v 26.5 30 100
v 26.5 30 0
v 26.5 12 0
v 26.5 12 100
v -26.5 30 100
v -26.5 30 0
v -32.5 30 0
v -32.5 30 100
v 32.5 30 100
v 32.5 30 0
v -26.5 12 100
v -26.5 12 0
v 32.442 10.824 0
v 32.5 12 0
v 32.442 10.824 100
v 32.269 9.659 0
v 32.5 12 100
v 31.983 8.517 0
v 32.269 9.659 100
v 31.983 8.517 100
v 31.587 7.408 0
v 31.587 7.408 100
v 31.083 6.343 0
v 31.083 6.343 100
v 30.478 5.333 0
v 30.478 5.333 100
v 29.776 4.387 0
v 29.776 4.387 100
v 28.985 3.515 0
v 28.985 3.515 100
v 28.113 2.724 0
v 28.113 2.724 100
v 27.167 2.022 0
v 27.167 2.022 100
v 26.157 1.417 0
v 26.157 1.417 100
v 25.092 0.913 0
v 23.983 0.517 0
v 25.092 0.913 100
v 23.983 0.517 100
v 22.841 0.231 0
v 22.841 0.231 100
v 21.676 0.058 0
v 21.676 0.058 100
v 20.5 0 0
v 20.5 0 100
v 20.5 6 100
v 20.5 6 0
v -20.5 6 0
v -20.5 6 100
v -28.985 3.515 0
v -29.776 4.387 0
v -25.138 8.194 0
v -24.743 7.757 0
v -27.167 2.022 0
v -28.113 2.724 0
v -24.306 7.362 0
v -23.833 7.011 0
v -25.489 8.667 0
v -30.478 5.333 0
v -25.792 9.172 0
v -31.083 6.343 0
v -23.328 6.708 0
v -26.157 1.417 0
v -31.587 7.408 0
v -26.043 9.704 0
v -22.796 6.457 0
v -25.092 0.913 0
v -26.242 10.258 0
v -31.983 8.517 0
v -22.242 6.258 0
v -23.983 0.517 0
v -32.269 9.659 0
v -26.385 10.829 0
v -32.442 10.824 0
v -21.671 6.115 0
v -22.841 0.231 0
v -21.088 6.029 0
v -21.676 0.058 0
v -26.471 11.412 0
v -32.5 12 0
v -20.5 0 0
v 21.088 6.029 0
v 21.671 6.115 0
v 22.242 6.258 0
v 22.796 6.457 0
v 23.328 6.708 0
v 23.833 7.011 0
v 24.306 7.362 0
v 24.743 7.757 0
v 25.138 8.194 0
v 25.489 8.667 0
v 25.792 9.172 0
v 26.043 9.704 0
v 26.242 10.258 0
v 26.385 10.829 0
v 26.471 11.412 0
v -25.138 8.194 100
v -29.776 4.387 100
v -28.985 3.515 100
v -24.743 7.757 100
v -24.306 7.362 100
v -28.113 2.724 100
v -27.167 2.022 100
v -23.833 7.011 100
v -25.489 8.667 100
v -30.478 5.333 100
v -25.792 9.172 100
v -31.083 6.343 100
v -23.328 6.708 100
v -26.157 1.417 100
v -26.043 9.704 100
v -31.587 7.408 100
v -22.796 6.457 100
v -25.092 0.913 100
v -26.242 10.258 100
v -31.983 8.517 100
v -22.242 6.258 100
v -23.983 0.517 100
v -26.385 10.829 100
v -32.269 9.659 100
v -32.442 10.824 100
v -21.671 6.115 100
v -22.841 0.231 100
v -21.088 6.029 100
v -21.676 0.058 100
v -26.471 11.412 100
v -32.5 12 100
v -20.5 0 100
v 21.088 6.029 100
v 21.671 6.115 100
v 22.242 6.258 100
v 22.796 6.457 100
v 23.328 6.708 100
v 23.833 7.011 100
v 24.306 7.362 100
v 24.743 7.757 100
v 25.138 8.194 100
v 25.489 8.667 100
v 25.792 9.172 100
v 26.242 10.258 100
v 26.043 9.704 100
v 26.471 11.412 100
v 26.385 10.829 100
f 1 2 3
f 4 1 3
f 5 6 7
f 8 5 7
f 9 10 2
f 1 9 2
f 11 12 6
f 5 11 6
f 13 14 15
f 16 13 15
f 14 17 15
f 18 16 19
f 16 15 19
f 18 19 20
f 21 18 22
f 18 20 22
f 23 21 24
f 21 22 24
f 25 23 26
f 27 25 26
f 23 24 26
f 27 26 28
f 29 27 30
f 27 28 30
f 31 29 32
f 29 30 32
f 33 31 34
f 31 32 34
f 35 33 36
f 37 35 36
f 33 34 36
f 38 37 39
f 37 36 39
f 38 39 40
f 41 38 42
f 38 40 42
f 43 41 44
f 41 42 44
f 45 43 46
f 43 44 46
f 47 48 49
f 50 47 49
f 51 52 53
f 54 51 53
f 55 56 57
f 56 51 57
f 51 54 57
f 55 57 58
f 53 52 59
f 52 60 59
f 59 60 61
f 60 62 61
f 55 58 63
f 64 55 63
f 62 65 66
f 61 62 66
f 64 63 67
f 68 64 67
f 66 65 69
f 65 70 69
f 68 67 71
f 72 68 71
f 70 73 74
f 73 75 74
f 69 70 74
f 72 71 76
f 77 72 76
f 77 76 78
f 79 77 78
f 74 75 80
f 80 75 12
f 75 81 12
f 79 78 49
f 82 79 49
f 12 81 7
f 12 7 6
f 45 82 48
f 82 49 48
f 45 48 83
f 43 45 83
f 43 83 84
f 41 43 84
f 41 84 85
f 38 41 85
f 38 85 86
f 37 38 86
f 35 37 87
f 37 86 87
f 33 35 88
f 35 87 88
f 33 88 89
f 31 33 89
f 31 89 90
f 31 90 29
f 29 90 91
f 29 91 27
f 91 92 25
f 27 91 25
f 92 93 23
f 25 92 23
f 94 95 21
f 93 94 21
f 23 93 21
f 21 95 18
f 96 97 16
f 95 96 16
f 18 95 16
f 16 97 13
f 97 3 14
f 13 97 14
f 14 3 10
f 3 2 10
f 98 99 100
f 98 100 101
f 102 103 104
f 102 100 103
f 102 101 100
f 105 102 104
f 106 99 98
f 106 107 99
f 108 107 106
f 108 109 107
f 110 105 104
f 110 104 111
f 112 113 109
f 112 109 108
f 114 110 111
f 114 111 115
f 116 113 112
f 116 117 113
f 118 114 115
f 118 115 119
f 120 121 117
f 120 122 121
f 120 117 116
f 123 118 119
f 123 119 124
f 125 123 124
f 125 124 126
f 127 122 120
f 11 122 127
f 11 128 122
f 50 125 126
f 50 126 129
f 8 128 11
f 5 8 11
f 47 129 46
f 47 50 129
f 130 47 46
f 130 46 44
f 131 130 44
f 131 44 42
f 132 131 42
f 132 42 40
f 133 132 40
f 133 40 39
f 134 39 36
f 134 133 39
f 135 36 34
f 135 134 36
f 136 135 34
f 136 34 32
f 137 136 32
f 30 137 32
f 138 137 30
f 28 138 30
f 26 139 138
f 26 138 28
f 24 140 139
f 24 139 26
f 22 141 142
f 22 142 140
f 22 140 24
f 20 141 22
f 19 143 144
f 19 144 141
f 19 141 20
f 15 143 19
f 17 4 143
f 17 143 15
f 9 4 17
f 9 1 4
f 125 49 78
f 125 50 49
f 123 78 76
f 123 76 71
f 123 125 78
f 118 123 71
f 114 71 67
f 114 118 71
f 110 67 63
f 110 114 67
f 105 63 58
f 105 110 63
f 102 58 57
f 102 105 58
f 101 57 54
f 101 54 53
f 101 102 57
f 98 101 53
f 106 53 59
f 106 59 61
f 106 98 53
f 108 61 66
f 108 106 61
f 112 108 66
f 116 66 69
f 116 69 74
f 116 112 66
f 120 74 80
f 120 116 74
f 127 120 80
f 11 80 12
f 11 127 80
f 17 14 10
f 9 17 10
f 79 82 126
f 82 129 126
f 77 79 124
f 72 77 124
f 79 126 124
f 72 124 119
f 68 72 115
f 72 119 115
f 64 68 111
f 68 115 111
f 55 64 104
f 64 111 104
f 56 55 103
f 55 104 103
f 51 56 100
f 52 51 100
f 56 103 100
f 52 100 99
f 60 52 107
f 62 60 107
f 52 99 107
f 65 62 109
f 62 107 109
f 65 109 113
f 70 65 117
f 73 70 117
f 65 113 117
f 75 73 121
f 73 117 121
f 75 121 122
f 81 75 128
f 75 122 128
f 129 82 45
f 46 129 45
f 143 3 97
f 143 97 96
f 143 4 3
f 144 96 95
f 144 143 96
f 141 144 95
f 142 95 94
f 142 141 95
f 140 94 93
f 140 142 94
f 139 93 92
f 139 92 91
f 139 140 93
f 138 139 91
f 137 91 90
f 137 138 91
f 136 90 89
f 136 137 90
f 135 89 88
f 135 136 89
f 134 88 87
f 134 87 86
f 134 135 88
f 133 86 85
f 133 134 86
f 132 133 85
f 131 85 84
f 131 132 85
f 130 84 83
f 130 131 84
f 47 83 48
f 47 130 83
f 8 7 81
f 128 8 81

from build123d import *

# Parameters (mm, degrees)
F1_DEPTH = 100
F2_R     = 6
F3_R     = 12


with BuildPart() as f1:
    # F0 (on Top) → F1 (new body)
    with BuildSketch(Plane.XY):
        Polygon((0, 6), (0, 0), (32.5, 0), (32.5, 30), (26.5, 30), (26.5, 6), align=None)
        Polygon((-32.5, 0), (0, 0), (0, 6), (-26.5, 6), (-26.5, 30), (-32.5, 30), align=None)
    extrude(amount=F1_DEPTH)

    # F2
    f2_edges = [f1.edges().sort_by_distance(p)[0] for p in [
        (26.5, 6, 50),
        (-26.5, 6, 50),
    ]]
    fillet(f2_edges, radius=F2_R)

    # F3
    f3_edges = [f1.edges().sort_by_distance(p)[0] for p in [
        (32.5, 0, 50),
        (-32.5, 0, 50),
    ]]
    fillet(f3_edges, radius=F3_R)


solid = f1.part
